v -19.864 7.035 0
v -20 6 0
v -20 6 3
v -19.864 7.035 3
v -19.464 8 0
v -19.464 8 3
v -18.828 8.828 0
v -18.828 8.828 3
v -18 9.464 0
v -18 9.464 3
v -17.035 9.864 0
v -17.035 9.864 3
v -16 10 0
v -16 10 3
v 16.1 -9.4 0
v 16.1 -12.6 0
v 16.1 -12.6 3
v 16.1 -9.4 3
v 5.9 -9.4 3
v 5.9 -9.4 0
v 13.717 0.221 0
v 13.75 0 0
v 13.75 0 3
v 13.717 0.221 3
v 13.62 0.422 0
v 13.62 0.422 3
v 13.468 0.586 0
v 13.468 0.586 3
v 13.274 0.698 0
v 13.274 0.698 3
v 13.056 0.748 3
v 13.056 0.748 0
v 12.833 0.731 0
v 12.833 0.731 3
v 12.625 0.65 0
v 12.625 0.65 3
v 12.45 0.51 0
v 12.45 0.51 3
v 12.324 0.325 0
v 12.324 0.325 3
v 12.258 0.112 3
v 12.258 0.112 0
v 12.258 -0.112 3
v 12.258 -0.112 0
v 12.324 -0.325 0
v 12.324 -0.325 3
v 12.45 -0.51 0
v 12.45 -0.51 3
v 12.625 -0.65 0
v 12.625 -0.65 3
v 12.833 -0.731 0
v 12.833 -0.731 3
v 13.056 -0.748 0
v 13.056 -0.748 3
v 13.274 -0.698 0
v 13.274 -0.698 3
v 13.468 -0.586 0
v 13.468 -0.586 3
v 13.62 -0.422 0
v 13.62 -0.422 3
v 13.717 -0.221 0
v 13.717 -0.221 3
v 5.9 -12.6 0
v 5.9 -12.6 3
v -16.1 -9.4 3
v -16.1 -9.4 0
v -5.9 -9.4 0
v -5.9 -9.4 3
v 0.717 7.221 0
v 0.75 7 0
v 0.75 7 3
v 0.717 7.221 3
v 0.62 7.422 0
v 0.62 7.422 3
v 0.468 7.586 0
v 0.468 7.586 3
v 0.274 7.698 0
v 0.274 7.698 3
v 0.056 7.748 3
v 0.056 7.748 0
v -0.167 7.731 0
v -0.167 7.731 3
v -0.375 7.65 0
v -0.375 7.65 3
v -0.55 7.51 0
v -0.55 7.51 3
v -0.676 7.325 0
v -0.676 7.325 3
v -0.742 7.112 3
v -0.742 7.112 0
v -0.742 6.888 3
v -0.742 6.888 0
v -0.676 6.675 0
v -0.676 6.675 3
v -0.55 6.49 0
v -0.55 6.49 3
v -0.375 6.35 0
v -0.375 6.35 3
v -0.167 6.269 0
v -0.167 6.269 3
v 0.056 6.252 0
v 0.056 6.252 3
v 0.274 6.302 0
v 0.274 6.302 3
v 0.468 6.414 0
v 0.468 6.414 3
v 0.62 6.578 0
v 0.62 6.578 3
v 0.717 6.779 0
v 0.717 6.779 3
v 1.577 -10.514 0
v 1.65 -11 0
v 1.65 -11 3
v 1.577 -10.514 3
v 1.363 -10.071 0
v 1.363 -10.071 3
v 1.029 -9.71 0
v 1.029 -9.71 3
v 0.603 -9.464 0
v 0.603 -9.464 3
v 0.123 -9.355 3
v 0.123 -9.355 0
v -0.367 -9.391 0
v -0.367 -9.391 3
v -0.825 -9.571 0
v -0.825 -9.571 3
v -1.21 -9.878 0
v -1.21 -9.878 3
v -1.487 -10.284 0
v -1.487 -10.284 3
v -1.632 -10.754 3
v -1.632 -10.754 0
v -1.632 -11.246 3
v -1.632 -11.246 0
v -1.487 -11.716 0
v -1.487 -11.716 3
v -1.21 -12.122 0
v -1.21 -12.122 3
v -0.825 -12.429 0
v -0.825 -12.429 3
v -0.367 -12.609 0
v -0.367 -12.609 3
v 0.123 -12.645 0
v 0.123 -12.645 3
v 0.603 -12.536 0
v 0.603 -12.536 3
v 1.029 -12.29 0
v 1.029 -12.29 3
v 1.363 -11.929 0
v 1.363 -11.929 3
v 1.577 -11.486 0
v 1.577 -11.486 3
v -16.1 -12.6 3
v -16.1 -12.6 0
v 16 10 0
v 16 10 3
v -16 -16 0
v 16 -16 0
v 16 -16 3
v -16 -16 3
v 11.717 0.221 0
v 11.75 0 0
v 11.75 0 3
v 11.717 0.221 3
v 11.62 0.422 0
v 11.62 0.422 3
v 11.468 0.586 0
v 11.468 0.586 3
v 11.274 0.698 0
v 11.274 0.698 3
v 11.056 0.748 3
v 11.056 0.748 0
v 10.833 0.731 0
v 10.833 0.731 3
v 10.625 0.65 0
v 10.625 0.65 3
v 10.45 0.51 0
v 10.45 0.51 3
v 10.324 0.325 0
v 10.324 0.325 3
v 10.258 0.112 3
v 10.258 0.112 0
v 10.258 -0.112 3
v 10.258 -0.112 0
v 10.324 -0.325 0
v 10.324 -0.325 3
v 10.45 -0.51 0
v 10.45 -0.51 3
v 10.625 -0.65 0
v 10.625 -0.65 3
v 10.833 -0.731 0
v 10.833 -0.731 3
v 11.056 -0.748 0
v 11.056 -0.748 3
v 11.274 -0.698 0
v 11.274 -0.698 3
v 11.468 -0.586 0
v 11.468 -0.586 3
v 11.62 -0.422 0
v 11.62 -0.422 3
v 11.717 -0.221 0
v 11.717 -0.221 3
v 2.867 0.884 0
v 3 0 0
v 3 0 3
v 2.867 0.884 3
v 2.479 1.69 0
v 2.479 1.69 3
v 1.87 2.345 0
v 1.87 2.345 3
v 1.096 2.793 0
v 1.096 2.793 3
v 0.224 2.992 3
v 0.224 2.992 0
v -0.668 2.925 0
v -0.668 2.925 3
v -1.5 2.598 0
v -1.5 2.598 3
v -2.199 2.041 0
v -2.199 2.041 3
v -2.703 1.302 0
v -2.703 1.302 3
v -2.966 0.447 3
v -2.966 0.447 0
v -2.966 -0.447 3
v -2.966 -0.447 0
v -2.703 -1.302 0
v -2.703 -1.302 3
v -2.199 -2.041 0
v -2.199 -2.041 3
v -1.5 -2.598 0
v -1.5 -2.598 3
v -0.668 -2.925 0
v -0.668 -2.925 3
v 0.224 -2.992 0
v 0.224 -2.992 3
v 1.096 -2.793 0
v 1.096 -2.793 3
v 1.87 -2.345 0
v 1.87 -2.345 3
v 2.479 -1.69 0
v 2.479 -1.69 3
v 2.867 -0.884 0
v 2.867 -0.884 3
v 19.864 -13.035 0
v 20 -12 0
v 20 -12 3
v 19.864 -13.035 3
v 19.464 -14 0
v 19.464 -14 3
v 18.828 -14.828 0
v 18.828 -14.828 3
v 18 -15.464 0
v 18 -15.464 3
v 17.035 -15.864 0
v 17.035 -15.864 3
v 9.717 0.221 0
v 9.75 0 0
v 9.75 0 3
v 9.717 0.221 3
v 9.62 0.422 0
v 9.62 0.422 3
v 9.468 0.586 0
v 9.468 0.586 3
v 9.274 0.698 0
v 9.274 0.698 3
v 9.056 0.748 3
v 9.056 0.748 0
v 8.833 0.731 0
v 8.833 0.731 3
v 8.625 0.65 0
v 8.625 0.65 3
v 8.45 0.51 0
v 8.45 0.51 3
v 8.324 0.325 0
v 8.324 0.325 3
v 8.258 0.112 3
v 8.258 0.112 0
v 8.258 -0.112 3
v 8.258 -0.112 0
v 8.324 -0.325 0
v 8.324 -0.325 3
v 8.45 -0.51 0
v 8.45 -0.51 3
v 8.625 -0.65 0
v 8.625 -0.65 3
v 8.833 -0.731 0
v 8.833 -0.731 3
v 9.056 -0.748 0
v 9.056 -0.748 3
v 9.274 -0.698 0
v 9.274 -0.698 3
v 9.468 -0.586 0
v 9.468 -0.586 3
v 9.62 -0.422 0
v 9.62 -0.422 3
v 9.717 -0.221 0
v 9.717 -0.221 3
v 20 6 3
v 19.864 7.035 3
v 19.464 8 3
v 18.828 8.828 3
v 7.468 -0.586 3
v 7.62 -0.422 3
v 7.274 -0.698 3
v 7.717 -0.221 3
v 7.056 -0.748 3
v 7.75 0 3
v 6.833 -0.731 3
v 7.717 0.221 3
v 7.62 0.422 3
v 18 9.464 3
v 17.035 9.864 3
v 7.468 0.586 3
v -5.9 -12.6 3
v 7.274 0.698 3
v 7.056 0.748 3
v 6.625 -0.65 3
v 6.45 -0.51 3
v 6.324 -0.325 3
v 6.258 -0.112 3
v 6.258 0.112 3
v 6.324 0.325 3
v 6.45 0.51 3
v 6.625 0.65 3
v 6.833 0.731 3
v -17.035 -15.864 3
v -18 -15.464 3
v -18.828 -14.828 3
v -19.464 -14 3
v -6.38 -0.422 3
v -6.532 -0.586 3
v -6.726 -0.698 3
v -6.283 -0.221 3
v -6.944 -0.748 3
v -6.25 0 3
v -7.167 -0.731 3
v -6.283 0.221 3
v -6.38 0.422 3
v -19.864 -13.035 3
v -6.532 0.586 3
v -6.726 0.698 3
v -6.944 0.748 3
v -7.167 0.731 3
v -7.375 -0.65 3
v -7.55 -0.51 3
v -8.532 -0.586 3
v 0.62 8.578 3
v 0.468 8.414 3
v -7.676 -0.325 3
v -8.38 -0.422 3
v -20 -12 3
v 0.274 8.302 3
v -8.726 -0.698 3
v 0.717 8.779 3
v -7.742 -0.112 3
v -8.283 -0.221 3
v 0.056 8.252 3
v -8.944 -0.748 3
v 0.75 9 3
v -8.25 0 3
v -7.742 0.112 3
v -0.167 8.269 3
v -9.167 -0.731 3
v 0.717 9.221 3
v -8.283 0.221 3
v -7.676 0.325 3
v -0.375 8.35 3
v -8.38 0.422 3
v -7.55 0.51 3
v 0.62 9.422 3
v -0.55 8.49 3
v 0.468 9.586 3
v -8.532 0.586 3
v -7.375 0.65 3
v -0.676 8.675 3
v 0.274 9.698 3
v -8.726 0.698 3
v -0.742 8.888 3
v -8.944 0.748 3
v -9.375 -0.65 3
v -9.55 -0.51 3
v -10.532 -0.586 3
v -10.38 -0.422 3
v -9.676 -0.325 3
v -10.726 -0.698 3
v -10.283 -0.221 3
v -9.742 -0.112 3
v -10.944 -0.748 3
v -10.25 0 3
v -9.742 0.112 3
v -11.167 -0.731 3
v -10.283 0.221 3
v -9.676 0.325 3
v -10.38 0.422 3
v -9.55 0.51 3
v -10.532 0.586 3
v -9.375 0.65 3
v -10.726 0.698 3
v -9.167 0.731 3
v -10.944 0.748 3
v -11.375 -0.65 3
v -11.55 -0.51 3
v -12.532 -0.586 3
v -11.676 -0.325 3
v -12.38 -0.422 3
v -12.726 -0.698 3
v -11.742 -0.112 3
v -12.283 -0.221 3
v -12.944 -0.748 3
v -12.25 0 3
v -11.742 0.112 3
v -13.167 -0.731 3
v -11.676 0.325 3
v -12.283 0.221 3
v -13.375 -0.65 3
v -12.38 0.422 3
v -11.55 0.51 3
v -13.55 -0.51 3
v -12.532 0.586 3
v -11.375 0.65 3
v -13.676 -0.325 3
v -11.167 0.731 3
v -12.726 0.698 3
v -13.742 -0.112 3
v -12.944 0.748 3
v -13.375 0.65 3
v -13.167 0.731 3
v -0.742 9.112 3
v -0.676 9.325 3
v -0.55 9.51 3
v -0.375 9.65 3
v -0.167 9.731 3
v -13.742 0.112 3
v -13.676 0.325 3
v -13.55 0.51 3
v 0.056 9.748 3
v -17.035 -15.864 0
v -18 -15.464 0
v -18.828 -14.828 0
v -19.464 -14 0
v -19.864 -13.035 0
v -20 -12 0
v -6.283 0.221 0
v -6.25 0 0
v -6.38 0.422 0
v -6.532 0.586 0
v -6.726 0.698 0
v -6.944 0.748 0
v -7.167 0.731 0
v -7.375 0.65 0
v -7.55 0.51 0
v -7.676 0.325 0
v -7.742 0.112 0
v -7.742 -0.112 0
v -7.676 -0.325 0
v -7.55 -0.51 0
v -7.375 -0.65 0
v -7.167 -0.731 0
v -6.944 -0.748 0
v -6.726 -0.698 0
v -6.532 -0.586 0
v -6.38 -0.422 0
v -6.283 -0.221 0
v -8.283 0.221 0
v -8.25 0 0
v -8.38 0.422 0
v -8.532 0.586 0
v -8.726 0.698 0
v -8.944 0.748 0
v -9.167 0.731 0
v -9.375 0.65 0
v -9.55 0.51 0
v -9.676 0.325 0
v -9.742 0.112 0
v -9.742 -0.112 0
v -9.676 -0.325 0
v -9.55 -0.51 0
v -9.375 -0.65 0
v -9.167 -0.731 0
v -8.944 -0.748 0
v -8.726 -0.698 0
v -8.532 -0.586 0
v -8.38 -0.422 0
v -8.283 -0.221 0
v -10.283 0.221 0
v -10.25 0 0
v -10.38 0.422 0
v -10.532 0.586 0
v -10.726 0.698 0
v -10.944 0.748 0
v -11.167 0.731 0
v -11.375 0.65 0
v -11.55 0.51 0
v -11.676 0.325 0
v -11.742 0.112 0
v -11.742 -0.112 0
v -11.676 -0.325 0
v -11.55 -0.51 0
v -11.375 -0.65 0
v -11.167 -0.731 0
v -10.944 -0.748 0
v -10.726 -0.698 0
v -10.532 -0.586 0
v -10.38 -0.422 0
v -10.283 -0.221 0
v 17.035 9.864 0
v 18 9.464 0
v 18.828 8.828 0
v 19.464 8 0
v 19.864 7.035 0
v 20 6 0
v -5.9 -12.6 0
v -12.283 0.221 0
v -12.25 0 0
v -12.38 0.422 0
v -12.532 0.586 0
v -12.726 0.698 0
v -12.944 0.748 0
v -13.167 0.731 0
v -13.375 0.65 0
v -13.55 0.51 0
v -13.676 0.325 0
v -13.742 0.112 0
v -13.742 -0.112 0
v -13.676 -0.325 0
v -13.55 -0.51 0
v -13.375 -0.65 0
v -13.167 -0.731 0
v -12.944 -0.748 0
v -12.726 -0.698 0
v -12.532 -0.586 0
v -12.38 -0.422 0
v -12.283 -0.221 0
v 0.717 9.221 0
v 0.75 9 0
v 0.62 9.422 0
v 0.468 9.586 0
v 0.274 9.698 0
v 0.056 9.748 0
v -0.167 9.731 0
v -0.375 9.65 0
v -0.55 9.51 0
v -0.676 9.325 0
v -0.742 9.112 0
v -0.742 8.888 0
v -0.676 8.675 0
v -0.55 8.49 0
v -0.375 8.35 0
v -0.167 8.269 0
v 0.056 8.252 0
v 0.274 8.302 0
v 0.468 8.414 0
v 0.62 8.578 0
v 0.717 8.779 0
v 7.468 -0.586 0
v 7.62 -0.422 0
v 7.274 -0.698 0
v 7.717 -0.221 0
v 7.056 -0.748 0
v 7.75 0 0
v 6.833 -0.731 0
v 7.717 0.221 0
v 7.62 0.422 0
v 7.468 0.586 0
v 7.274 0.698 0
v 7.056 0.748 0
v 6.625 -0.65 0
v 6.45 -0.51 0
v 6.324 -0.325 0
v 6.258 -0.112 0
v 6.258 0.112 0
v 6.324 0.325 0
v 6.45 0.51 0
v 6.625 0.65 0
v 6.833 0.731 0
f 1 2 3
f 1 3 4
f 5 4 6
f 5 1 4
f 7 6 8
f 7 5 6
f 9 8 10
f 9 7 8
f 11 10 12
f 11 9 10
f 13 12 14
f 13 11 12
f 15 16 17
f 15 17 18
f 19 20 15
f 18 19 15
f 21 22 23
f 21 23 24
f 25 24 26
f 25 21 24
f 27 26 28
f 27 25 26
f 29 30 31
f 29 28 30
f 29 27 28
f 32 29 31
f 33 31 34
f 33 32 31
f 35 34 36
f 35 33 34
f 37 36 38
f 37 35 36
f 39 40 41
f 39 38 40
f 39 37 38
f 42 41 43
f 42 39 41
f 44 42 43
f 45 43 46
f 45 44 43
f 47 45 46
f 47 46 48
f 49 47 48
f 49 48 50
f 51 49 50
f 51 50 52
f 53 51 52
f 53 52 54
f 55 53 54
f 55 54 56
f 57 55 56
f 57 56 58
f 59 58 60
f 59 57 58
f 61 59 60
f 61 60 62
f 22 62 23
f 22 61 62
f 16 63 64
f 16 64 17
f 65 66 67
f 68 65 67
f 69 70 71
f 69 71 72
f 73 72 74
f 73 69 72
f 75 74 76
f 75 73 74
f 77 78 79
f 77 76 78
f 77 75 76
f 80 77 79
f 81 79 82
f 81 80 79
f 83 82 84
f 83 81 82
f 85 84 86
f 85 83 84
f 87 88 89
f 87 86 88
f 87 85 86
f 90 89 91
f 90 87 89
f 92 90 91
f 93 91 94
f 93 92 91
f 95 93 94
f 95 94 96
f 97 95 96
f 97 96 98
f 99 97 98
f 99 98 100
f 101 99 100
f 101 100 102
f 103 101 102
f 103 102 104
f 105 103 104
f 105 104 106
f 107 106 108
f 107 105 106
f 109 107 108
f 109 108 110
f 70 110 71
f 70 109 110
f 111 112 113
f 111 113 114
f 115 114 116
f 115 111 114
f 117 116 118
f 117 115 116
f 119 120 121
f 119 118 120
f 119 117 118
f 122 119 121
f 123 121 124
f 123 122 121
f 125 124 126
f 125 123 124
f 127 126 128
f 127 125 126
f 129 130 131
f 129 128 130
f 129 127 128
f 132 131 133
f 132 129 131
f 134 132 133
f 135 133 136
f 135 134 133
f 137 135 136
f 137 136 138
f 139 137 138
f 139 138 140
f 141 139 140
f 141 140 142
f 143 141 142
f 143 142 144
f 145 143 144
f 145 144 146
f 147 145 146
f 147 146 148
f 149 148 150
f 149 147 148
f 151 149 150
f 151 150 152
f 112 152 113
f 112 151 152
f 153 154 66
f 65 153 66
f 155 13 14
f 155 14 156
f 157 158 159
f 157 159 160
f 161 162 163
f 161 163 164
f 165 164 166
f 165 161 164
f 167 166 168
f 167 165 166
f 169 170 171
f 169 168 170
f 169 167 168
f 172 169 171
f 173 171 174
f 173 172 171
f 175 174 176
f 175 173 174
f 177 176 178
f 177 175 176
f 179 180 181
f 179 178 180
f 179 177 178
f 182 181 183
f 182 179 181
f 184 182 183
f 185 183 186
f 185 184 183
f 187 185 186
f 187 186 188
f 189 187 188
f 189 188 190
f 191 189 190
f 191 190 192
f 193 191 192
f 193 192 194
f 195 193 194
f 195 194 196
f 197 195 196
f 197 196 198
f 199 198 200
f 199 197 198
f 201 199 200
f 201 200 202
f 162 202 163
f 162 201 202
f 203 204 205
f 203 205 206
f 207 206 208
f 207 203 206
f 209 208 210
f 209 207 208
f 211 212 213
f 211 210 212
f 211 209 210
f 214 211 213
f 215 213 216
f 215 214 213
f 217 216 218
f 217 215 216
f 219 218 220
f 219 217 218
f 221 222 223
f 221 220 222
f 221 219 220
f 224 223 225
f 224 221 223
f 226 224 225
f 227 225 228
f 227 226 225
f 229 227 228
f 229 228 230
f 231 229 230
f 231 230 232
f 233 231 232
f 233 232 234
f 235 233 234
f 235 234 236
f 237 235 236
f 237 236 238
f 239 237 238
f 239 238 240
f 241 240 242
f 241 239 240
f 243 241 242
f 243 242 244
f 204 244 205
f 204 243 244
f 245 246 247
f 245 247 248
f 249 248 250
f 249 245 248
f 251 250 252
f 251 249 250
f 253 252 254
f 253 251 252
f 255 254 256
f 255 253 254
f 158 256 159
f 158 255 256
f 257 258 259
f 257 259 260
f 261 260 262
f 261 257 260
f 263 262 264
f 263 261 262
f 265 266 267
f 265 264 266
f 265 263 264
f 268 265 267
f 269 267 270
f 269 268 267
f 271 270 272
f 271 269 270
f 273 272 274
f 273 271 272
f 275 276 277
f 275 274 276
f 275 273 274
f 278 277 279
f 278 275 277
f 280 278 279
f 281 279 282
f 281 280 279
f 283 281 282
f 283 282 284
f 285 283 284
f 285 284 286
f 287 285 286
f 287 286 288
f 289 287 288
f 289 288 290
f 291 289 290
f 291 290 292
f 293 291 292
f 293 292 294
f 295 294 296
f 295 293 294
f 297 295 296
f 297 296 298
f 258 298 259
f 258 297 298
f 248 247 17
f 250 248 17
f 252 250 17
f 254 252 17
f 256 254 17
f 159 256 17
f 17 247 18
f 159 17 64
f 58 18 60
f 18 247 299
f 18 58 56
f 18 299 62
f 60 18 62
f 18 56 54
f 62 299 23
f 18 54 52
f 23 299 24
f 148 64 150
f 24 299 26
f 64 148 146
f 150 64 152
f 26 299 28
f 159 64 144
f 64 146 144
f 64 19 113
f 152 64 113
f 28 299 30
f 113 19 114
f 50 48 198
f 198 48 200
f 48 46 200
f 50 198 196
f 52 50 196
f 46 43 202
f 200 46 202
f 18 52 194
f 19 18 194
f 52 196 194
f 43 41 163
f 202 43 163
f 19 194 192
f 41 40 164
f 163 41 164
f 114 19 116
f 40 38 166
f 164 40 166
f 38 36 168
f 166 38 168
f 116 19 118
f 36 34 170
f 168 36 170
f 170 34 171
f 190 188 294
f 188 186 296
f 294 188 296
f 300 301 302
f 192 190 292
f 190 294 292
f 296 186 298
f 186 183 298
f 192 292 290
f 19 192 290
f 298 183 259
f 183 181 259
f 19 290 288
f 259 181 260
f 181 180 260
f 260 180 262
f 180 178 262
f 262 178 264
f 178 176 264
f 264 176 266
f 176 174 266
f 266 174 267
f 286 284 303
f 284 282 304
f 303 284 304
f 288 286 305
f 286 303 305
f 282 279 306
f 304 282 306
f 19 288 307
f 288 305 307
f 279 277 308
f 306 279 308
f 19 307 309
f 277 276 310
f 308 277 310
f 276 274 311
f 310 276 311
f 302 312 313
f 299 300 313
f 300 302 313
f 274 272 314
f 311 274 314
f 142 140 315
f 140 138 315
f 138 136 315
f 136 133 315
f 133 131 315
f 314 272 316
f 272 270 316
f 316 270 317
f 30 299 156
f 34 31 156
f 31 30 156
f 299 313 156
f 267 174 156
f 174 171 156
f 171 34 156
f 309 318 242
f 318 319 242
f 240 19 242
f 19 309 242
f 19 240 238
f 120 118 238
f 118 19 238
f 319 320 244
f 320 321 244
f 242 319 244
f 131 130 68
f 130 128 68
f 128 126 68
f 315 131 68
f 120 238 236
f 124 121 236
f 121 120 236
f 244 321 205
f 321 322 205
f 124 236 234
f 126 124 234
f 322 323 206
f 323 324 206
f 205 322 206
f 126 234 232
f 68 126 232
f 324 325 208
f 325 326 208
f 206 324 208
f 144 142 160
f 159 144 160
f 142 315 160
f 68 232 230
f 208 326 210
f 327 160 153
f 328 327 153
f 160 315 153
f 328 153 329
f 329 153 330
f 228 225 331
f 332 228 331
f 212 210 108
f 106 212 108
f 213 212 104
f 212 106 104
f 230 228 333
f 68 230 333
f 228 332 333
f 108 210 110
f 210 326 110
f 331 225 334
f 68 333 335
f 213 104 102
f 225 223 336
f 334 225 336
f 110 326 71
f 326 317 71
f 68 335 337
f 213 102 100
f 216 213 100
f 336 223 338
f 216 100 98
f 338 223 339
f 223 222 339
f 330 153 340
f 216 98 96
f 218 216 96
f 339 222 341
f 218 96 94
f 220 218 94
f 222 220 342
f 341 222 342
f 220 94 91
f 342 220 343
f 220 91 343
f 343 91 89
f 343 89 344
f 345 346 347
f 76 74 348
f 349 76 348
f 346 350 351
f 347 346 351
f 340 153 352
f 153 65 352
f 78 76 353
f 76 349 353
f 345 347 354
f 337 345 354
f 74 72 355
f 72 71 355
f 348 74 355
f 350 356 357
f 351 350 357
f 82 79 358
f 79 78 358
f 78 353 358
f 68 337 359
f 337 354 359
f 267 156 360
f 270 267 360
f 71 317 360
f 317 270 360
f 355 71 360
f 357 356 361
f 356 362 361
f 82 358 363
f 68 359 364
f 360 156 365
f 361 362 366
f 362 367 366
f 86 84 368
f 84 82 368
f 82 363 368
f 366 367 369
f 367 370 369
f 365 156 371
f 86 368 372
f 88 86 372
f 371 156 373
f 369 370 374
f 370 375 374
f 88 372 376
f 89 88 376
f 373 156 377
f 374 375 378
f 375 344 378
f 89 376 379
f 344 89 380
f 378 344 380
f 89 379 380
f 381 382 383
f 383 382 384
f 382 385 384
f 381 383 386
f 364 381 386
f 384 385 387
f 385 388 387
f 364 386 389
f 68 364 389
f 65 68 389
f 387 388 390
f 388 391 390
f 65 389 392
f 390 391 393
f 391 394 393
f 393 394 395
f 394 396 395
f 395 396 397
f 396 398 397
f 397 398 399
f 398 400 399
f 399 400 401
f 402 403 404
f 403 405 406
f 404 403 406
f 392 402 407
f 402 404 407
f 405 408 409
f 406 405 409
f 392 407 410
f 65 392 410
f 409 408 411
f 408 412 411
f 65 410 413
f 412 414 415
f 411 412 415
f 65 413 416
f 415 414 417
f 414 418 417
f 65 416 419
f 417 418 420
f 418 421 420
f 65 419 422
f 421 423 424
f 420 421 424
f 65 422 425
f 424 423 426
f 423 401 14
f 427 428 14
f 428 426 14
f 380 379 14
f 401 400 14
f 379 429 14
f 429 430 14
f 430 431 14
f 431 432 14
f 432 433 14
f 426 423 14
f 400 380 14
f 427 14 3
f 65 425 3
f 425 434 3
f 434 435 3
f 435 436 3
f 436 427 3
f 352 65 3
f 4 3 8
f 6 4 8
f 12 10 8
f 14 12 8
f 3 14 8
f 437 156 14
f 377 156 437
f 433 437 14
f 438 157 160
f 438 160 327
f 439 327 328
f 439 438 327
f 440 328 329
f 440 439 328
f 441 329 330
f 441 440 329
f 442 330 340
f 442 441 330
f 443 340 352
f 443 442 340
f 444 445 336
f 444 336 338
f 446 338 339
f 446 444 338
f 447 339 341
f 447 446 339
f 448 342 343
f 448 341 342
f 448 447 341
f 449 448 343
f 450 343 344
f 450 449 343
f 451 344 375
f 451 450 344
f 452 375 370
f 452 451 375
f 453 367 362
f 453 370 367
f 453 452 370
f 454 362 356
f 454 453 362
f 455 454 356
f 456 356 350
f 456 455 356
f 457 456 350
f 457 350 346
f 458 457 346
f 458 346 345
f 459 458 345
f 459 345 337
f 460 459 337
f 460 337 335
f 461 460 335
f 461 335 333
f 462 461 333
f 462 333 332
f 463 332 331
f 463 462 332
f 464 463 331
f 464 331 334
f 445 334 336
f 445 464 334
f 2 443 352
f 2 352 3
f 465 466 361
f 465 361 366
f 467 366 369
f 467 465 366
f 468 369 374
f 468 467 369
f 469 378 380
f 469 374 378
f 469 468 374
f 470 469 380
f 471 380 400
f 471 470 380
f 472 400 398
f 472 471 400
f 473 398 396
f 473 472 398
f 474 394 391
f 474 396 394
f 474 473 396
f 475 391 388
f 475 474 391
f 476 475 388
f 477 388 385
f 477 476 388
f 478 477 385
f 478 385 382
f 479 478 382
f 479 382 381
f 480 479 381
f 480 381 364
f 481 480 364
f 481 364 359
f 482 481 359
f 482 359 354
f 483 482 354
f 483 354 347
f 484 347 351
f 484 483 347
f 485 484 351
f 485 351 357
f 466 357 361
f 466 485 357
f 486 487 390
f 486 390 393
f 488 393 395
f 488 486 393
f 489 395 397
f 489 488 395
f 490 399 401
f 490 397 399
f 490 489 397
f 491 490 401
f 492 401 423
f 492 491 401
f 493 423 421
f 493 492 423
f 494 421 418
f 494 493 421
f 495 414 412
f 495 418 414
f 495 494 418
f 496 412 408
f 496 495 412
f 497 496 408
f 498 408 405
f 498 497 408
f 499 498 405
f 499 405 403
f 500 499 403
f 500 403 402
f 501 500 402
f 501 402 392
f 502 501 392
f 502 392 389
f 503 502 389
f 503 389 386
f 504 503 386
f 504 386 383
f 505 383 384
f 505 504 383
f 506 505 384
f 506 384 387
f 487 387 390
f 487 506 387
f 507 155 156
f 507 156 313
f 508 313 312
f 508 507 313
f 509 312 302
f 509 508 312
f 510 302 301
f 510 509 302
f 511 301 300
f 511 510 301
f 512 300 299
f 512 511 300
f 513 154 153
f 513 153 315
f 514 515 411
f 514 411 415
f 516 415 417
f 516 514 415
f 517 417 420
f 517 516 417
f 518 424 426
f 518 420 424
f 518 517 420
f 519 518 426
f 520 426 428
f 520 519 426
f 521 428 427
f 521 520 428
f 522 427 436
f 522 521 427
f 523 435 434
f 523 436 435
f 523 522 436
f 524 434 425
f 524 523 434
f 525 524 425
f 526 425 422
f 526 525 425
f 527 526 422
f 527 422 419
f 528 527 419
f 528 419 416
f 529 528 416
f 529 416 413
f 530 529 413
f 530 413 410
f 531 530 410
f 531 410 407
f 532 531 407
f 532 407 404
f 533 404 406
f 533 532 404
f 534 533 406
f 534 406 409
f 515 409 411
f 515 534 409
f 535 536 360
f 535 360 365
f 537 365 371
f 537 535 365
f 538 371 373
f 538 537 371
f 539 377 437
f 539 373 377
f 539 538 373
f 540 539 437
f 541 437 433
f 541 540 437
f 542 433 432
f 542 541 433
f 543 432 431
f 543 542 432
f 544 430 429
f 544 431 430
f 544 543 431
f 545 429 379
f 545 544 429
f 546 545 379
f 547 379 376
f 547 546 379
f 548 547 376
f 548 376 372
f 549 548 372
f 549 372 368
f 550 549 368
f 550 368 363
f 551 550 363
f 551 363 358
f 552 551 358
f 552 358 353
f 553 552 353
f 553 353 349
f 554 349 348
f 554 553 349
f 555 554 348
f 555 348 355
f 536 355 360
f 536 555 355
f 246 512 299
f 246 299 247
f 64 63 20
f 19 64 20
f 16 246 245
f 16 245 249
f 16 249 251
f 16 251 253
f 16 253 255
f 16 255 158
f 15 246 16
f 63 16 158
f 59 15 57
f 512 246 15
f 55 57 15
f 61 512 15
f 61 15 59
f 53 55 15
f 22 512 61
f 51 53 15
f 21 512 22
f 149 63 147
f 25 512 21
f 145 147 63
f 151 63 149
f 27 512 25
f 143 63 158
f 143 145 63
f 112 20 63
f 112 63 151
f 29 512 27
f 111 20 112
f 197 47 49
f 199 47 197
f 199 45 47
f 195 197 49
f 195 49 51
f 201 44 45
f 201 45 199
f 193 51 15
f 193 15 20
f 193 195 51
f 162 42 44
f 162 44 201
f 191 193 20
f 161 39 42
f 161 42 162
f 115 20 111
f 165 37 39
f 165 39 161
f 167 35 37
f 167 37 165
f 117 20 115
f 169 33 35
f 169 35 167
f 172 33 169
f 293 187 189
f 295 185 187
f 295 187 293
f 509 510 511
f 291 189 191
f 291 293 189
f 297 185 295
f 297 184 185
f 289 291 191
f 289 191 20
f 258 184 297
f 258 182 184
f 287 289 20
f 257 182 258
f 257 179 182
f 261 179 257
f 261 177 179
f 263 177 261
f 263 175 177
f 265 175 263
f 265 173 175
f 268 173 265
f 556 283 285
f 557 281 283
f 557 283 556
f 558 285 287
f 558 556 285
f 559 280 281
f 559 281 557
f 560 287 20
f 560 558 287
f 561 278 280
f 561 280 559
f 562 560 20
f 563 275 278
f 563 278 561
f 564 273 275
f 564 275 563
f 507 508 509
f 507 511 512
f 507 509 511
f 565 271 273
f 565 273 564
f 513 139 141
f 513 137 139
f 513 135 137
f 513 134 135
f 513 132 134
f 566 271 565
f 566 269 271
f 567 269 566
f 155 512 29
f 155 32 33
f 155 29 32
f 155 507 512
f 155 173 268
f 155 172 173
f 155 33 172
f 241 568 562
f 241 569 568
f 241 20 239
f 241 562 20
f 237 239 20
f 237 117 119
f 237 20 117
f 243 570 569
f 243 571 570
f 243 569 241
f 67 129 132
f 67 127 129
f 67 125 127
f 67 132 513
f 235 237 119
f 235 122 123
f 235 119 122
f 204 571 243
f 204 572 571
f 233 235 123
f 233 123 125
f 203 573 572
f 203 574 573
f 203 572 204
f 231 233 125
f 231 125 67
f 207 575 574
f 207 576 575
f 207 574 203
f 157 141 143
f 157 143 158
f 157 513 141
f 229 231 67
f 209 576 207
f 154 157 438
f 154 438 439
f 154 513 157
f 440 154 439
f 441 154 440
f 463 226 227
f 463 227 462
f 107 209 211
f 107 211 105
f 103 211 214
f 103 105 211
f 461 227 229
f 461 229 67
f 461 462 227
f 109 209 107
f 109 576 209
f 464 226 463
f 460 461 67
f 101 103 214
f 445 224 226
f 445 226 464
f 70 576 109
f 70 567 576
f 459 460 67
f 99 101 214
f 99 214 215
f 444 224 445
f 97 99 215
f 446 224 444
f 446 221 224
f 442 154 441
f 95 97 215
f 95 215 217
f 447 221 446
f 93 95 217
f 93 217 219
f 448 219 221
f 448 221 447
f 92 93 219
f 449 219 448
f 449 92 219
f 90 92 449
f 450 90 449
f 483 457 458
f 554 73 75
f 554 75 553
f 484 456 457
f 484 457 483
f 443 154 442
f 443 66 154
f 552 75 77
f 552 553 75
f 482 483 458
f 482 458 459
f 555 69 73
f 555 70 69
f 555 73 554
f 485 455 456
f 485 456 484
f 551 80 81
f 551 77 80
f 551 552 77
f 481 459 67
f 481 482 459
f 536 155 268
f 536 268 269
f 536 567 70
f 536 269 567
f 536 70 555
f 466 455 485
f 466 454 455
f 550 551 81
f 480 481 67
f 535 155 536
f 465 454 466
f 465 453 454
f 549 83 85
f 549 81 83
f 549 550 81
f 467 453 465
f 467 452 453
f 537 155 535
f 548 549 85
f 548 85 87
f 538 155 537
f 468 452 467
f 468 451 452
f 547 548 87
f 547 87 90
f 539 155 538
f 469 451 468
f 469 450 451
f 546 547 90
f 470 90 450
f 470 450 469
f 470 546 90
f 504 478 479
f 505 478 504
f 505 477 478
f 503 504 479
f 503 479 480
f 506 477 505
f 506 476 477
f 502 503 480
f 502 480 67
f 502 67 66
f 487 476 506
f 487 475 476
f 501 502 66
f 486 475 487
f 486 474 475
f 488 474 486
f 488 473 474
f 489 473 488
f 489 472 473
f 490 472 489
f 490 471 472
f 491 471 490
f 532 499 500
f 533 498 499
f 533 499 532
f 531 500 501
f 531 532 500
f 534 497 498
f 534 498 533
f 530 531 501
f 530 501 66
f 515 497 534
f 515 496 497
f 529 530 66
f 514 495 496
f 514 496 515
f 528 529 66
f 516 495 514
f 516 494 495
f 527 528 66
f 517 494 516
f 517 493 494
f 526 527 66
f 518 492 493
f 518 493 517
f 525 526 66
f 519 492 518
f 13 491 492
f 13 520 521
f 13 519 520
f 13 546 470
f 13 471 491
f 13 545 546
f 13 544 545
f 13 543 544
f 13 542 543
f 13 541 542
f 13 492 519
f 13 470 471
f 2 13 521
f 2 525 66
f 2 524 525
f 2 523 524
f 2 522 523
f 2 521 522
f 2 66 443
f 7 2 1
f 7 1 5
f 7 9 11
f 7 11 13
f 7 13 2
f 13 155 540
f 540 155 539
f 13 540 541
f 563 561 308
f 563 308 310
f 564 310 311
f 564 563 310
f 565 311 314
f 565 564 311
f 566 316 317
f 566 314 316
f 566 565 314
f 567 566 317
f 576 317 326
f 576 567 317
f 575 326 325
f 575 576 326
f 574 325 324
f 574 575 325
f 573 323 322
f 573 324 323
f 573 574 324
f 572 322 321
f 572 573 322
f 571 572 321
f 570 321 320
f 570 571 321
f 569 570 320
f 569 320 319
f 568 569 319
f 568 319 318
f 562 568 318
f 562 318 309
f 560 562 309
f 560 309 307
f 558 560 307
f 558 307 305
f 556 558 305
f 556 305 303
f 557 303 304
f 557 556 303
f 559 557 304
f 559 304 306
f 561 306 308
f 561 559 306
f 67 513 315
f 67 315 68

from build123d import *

# Parameters (mm, degrees)
ESKIZ_KONTUR_W        = 10.2
ESKIZ_KONTUR_H        = 3.2
PLASTINA_DEPTH        = 3
OTVERSTIYA_DEPTH      = 26.787593916
OTVERSTIYA_DEPTH_BACK = 26.787593916
ESKIZ_OTVERSTIYA_R    = 1.65
ESKIZ_OTVERSTIYA_R_2  = 0.75
ESKIZ_OTVERSTIYA_R_3  = 3


with BuildPart() as part:
    # Eskiz_kontur → Plastina (new body)
    with BuildSketch(Plane.XY):
        with BuildLine():
            Line((-20, -12), (-20, 6))
            ThreePointArc((-20, 6), (-18.828427125, 8.828427125), (-16, 10))
            Line((-16, 10), (16, 10))
            ThreePointArc((16, 10), (18.828427125, 8.828427125), (20, 6))
            Line((20, 6), (20, -12))
            ThreePointArc((20, -12), (18.828427125, -14.828427125), (16, -16))
            Line((16, -16), (-16, -16))
            ThreePointArc((-16, -16), (-18.828427125, -14.828427125), (-20, -12))
        make_face()
        with Locations((-11, -11)):
            Rectangle(ESKIZ_KONTUR_W, ESKIZ_KONTUR_H, mode=Mode.SUBTRACT)
        with Locations((11, -11)):
            Rectangle(ESKIZ_KONTUR_W, ESKIZ_KONTUR_H, mode=Mode.SUBTRACT)
    extrude(amount=PLASTINA_DEPTH)

    # Eskiz_otverstiya → Otverstiya (cut, two sides: drawn at the far end of the back side and taken through both)
    with BuildSketch(Plane.XY.offset(-OTVERSTIYA_DEPTH_BACK)):
        with Locations((0, -11)):
            Circle(ESKIZ_OTVERSTIYA_R)
        with Locations((-13, 0)):
            Circle(ESKIZ_OTVERSTIYA_R_2)
        with Locations((-11, 0)):
            Circle(ESKIZ_OTVERSTIYA_R_2)
        with Locations((-9, 0)):
            Circle(ESKIZ_OTVERSTIYA_R_2)
        with Locations((-7, 0)):
            Circle(ESKIZ_OTVERSTIYA_R_2)
        Circle(ESKIZ_OTVERSTIYA_R_3)
        with Locations((7, 0)):
            Circle(ESKIZ_OTVERSTIYA_R_2)
        with Locations((9, 0)):
            Circle(ESKIZ_OTVERSTIYA_R_2)
        with Locations((11, 0)):
            Circle(ESKIZ_OTVERSTIYA_R_2)
        with Locations((13, 0)):
            Circle(ESKIZ_OTVERSTIYA_R_2)
        with Locations((0, 7)):
            Circle(ESKIZ_OTVERSTIYA_R_2)
        with Locations((0, 9)):
            Circle(ESKIZ_OTVERSTIYA_R_2)
    extrude(amount=OTVERSTIYA_DEPTH + OTVERSTIYA_DEPTH_BACK, mode=Mode.SUBTRACT)


solid = part.part
